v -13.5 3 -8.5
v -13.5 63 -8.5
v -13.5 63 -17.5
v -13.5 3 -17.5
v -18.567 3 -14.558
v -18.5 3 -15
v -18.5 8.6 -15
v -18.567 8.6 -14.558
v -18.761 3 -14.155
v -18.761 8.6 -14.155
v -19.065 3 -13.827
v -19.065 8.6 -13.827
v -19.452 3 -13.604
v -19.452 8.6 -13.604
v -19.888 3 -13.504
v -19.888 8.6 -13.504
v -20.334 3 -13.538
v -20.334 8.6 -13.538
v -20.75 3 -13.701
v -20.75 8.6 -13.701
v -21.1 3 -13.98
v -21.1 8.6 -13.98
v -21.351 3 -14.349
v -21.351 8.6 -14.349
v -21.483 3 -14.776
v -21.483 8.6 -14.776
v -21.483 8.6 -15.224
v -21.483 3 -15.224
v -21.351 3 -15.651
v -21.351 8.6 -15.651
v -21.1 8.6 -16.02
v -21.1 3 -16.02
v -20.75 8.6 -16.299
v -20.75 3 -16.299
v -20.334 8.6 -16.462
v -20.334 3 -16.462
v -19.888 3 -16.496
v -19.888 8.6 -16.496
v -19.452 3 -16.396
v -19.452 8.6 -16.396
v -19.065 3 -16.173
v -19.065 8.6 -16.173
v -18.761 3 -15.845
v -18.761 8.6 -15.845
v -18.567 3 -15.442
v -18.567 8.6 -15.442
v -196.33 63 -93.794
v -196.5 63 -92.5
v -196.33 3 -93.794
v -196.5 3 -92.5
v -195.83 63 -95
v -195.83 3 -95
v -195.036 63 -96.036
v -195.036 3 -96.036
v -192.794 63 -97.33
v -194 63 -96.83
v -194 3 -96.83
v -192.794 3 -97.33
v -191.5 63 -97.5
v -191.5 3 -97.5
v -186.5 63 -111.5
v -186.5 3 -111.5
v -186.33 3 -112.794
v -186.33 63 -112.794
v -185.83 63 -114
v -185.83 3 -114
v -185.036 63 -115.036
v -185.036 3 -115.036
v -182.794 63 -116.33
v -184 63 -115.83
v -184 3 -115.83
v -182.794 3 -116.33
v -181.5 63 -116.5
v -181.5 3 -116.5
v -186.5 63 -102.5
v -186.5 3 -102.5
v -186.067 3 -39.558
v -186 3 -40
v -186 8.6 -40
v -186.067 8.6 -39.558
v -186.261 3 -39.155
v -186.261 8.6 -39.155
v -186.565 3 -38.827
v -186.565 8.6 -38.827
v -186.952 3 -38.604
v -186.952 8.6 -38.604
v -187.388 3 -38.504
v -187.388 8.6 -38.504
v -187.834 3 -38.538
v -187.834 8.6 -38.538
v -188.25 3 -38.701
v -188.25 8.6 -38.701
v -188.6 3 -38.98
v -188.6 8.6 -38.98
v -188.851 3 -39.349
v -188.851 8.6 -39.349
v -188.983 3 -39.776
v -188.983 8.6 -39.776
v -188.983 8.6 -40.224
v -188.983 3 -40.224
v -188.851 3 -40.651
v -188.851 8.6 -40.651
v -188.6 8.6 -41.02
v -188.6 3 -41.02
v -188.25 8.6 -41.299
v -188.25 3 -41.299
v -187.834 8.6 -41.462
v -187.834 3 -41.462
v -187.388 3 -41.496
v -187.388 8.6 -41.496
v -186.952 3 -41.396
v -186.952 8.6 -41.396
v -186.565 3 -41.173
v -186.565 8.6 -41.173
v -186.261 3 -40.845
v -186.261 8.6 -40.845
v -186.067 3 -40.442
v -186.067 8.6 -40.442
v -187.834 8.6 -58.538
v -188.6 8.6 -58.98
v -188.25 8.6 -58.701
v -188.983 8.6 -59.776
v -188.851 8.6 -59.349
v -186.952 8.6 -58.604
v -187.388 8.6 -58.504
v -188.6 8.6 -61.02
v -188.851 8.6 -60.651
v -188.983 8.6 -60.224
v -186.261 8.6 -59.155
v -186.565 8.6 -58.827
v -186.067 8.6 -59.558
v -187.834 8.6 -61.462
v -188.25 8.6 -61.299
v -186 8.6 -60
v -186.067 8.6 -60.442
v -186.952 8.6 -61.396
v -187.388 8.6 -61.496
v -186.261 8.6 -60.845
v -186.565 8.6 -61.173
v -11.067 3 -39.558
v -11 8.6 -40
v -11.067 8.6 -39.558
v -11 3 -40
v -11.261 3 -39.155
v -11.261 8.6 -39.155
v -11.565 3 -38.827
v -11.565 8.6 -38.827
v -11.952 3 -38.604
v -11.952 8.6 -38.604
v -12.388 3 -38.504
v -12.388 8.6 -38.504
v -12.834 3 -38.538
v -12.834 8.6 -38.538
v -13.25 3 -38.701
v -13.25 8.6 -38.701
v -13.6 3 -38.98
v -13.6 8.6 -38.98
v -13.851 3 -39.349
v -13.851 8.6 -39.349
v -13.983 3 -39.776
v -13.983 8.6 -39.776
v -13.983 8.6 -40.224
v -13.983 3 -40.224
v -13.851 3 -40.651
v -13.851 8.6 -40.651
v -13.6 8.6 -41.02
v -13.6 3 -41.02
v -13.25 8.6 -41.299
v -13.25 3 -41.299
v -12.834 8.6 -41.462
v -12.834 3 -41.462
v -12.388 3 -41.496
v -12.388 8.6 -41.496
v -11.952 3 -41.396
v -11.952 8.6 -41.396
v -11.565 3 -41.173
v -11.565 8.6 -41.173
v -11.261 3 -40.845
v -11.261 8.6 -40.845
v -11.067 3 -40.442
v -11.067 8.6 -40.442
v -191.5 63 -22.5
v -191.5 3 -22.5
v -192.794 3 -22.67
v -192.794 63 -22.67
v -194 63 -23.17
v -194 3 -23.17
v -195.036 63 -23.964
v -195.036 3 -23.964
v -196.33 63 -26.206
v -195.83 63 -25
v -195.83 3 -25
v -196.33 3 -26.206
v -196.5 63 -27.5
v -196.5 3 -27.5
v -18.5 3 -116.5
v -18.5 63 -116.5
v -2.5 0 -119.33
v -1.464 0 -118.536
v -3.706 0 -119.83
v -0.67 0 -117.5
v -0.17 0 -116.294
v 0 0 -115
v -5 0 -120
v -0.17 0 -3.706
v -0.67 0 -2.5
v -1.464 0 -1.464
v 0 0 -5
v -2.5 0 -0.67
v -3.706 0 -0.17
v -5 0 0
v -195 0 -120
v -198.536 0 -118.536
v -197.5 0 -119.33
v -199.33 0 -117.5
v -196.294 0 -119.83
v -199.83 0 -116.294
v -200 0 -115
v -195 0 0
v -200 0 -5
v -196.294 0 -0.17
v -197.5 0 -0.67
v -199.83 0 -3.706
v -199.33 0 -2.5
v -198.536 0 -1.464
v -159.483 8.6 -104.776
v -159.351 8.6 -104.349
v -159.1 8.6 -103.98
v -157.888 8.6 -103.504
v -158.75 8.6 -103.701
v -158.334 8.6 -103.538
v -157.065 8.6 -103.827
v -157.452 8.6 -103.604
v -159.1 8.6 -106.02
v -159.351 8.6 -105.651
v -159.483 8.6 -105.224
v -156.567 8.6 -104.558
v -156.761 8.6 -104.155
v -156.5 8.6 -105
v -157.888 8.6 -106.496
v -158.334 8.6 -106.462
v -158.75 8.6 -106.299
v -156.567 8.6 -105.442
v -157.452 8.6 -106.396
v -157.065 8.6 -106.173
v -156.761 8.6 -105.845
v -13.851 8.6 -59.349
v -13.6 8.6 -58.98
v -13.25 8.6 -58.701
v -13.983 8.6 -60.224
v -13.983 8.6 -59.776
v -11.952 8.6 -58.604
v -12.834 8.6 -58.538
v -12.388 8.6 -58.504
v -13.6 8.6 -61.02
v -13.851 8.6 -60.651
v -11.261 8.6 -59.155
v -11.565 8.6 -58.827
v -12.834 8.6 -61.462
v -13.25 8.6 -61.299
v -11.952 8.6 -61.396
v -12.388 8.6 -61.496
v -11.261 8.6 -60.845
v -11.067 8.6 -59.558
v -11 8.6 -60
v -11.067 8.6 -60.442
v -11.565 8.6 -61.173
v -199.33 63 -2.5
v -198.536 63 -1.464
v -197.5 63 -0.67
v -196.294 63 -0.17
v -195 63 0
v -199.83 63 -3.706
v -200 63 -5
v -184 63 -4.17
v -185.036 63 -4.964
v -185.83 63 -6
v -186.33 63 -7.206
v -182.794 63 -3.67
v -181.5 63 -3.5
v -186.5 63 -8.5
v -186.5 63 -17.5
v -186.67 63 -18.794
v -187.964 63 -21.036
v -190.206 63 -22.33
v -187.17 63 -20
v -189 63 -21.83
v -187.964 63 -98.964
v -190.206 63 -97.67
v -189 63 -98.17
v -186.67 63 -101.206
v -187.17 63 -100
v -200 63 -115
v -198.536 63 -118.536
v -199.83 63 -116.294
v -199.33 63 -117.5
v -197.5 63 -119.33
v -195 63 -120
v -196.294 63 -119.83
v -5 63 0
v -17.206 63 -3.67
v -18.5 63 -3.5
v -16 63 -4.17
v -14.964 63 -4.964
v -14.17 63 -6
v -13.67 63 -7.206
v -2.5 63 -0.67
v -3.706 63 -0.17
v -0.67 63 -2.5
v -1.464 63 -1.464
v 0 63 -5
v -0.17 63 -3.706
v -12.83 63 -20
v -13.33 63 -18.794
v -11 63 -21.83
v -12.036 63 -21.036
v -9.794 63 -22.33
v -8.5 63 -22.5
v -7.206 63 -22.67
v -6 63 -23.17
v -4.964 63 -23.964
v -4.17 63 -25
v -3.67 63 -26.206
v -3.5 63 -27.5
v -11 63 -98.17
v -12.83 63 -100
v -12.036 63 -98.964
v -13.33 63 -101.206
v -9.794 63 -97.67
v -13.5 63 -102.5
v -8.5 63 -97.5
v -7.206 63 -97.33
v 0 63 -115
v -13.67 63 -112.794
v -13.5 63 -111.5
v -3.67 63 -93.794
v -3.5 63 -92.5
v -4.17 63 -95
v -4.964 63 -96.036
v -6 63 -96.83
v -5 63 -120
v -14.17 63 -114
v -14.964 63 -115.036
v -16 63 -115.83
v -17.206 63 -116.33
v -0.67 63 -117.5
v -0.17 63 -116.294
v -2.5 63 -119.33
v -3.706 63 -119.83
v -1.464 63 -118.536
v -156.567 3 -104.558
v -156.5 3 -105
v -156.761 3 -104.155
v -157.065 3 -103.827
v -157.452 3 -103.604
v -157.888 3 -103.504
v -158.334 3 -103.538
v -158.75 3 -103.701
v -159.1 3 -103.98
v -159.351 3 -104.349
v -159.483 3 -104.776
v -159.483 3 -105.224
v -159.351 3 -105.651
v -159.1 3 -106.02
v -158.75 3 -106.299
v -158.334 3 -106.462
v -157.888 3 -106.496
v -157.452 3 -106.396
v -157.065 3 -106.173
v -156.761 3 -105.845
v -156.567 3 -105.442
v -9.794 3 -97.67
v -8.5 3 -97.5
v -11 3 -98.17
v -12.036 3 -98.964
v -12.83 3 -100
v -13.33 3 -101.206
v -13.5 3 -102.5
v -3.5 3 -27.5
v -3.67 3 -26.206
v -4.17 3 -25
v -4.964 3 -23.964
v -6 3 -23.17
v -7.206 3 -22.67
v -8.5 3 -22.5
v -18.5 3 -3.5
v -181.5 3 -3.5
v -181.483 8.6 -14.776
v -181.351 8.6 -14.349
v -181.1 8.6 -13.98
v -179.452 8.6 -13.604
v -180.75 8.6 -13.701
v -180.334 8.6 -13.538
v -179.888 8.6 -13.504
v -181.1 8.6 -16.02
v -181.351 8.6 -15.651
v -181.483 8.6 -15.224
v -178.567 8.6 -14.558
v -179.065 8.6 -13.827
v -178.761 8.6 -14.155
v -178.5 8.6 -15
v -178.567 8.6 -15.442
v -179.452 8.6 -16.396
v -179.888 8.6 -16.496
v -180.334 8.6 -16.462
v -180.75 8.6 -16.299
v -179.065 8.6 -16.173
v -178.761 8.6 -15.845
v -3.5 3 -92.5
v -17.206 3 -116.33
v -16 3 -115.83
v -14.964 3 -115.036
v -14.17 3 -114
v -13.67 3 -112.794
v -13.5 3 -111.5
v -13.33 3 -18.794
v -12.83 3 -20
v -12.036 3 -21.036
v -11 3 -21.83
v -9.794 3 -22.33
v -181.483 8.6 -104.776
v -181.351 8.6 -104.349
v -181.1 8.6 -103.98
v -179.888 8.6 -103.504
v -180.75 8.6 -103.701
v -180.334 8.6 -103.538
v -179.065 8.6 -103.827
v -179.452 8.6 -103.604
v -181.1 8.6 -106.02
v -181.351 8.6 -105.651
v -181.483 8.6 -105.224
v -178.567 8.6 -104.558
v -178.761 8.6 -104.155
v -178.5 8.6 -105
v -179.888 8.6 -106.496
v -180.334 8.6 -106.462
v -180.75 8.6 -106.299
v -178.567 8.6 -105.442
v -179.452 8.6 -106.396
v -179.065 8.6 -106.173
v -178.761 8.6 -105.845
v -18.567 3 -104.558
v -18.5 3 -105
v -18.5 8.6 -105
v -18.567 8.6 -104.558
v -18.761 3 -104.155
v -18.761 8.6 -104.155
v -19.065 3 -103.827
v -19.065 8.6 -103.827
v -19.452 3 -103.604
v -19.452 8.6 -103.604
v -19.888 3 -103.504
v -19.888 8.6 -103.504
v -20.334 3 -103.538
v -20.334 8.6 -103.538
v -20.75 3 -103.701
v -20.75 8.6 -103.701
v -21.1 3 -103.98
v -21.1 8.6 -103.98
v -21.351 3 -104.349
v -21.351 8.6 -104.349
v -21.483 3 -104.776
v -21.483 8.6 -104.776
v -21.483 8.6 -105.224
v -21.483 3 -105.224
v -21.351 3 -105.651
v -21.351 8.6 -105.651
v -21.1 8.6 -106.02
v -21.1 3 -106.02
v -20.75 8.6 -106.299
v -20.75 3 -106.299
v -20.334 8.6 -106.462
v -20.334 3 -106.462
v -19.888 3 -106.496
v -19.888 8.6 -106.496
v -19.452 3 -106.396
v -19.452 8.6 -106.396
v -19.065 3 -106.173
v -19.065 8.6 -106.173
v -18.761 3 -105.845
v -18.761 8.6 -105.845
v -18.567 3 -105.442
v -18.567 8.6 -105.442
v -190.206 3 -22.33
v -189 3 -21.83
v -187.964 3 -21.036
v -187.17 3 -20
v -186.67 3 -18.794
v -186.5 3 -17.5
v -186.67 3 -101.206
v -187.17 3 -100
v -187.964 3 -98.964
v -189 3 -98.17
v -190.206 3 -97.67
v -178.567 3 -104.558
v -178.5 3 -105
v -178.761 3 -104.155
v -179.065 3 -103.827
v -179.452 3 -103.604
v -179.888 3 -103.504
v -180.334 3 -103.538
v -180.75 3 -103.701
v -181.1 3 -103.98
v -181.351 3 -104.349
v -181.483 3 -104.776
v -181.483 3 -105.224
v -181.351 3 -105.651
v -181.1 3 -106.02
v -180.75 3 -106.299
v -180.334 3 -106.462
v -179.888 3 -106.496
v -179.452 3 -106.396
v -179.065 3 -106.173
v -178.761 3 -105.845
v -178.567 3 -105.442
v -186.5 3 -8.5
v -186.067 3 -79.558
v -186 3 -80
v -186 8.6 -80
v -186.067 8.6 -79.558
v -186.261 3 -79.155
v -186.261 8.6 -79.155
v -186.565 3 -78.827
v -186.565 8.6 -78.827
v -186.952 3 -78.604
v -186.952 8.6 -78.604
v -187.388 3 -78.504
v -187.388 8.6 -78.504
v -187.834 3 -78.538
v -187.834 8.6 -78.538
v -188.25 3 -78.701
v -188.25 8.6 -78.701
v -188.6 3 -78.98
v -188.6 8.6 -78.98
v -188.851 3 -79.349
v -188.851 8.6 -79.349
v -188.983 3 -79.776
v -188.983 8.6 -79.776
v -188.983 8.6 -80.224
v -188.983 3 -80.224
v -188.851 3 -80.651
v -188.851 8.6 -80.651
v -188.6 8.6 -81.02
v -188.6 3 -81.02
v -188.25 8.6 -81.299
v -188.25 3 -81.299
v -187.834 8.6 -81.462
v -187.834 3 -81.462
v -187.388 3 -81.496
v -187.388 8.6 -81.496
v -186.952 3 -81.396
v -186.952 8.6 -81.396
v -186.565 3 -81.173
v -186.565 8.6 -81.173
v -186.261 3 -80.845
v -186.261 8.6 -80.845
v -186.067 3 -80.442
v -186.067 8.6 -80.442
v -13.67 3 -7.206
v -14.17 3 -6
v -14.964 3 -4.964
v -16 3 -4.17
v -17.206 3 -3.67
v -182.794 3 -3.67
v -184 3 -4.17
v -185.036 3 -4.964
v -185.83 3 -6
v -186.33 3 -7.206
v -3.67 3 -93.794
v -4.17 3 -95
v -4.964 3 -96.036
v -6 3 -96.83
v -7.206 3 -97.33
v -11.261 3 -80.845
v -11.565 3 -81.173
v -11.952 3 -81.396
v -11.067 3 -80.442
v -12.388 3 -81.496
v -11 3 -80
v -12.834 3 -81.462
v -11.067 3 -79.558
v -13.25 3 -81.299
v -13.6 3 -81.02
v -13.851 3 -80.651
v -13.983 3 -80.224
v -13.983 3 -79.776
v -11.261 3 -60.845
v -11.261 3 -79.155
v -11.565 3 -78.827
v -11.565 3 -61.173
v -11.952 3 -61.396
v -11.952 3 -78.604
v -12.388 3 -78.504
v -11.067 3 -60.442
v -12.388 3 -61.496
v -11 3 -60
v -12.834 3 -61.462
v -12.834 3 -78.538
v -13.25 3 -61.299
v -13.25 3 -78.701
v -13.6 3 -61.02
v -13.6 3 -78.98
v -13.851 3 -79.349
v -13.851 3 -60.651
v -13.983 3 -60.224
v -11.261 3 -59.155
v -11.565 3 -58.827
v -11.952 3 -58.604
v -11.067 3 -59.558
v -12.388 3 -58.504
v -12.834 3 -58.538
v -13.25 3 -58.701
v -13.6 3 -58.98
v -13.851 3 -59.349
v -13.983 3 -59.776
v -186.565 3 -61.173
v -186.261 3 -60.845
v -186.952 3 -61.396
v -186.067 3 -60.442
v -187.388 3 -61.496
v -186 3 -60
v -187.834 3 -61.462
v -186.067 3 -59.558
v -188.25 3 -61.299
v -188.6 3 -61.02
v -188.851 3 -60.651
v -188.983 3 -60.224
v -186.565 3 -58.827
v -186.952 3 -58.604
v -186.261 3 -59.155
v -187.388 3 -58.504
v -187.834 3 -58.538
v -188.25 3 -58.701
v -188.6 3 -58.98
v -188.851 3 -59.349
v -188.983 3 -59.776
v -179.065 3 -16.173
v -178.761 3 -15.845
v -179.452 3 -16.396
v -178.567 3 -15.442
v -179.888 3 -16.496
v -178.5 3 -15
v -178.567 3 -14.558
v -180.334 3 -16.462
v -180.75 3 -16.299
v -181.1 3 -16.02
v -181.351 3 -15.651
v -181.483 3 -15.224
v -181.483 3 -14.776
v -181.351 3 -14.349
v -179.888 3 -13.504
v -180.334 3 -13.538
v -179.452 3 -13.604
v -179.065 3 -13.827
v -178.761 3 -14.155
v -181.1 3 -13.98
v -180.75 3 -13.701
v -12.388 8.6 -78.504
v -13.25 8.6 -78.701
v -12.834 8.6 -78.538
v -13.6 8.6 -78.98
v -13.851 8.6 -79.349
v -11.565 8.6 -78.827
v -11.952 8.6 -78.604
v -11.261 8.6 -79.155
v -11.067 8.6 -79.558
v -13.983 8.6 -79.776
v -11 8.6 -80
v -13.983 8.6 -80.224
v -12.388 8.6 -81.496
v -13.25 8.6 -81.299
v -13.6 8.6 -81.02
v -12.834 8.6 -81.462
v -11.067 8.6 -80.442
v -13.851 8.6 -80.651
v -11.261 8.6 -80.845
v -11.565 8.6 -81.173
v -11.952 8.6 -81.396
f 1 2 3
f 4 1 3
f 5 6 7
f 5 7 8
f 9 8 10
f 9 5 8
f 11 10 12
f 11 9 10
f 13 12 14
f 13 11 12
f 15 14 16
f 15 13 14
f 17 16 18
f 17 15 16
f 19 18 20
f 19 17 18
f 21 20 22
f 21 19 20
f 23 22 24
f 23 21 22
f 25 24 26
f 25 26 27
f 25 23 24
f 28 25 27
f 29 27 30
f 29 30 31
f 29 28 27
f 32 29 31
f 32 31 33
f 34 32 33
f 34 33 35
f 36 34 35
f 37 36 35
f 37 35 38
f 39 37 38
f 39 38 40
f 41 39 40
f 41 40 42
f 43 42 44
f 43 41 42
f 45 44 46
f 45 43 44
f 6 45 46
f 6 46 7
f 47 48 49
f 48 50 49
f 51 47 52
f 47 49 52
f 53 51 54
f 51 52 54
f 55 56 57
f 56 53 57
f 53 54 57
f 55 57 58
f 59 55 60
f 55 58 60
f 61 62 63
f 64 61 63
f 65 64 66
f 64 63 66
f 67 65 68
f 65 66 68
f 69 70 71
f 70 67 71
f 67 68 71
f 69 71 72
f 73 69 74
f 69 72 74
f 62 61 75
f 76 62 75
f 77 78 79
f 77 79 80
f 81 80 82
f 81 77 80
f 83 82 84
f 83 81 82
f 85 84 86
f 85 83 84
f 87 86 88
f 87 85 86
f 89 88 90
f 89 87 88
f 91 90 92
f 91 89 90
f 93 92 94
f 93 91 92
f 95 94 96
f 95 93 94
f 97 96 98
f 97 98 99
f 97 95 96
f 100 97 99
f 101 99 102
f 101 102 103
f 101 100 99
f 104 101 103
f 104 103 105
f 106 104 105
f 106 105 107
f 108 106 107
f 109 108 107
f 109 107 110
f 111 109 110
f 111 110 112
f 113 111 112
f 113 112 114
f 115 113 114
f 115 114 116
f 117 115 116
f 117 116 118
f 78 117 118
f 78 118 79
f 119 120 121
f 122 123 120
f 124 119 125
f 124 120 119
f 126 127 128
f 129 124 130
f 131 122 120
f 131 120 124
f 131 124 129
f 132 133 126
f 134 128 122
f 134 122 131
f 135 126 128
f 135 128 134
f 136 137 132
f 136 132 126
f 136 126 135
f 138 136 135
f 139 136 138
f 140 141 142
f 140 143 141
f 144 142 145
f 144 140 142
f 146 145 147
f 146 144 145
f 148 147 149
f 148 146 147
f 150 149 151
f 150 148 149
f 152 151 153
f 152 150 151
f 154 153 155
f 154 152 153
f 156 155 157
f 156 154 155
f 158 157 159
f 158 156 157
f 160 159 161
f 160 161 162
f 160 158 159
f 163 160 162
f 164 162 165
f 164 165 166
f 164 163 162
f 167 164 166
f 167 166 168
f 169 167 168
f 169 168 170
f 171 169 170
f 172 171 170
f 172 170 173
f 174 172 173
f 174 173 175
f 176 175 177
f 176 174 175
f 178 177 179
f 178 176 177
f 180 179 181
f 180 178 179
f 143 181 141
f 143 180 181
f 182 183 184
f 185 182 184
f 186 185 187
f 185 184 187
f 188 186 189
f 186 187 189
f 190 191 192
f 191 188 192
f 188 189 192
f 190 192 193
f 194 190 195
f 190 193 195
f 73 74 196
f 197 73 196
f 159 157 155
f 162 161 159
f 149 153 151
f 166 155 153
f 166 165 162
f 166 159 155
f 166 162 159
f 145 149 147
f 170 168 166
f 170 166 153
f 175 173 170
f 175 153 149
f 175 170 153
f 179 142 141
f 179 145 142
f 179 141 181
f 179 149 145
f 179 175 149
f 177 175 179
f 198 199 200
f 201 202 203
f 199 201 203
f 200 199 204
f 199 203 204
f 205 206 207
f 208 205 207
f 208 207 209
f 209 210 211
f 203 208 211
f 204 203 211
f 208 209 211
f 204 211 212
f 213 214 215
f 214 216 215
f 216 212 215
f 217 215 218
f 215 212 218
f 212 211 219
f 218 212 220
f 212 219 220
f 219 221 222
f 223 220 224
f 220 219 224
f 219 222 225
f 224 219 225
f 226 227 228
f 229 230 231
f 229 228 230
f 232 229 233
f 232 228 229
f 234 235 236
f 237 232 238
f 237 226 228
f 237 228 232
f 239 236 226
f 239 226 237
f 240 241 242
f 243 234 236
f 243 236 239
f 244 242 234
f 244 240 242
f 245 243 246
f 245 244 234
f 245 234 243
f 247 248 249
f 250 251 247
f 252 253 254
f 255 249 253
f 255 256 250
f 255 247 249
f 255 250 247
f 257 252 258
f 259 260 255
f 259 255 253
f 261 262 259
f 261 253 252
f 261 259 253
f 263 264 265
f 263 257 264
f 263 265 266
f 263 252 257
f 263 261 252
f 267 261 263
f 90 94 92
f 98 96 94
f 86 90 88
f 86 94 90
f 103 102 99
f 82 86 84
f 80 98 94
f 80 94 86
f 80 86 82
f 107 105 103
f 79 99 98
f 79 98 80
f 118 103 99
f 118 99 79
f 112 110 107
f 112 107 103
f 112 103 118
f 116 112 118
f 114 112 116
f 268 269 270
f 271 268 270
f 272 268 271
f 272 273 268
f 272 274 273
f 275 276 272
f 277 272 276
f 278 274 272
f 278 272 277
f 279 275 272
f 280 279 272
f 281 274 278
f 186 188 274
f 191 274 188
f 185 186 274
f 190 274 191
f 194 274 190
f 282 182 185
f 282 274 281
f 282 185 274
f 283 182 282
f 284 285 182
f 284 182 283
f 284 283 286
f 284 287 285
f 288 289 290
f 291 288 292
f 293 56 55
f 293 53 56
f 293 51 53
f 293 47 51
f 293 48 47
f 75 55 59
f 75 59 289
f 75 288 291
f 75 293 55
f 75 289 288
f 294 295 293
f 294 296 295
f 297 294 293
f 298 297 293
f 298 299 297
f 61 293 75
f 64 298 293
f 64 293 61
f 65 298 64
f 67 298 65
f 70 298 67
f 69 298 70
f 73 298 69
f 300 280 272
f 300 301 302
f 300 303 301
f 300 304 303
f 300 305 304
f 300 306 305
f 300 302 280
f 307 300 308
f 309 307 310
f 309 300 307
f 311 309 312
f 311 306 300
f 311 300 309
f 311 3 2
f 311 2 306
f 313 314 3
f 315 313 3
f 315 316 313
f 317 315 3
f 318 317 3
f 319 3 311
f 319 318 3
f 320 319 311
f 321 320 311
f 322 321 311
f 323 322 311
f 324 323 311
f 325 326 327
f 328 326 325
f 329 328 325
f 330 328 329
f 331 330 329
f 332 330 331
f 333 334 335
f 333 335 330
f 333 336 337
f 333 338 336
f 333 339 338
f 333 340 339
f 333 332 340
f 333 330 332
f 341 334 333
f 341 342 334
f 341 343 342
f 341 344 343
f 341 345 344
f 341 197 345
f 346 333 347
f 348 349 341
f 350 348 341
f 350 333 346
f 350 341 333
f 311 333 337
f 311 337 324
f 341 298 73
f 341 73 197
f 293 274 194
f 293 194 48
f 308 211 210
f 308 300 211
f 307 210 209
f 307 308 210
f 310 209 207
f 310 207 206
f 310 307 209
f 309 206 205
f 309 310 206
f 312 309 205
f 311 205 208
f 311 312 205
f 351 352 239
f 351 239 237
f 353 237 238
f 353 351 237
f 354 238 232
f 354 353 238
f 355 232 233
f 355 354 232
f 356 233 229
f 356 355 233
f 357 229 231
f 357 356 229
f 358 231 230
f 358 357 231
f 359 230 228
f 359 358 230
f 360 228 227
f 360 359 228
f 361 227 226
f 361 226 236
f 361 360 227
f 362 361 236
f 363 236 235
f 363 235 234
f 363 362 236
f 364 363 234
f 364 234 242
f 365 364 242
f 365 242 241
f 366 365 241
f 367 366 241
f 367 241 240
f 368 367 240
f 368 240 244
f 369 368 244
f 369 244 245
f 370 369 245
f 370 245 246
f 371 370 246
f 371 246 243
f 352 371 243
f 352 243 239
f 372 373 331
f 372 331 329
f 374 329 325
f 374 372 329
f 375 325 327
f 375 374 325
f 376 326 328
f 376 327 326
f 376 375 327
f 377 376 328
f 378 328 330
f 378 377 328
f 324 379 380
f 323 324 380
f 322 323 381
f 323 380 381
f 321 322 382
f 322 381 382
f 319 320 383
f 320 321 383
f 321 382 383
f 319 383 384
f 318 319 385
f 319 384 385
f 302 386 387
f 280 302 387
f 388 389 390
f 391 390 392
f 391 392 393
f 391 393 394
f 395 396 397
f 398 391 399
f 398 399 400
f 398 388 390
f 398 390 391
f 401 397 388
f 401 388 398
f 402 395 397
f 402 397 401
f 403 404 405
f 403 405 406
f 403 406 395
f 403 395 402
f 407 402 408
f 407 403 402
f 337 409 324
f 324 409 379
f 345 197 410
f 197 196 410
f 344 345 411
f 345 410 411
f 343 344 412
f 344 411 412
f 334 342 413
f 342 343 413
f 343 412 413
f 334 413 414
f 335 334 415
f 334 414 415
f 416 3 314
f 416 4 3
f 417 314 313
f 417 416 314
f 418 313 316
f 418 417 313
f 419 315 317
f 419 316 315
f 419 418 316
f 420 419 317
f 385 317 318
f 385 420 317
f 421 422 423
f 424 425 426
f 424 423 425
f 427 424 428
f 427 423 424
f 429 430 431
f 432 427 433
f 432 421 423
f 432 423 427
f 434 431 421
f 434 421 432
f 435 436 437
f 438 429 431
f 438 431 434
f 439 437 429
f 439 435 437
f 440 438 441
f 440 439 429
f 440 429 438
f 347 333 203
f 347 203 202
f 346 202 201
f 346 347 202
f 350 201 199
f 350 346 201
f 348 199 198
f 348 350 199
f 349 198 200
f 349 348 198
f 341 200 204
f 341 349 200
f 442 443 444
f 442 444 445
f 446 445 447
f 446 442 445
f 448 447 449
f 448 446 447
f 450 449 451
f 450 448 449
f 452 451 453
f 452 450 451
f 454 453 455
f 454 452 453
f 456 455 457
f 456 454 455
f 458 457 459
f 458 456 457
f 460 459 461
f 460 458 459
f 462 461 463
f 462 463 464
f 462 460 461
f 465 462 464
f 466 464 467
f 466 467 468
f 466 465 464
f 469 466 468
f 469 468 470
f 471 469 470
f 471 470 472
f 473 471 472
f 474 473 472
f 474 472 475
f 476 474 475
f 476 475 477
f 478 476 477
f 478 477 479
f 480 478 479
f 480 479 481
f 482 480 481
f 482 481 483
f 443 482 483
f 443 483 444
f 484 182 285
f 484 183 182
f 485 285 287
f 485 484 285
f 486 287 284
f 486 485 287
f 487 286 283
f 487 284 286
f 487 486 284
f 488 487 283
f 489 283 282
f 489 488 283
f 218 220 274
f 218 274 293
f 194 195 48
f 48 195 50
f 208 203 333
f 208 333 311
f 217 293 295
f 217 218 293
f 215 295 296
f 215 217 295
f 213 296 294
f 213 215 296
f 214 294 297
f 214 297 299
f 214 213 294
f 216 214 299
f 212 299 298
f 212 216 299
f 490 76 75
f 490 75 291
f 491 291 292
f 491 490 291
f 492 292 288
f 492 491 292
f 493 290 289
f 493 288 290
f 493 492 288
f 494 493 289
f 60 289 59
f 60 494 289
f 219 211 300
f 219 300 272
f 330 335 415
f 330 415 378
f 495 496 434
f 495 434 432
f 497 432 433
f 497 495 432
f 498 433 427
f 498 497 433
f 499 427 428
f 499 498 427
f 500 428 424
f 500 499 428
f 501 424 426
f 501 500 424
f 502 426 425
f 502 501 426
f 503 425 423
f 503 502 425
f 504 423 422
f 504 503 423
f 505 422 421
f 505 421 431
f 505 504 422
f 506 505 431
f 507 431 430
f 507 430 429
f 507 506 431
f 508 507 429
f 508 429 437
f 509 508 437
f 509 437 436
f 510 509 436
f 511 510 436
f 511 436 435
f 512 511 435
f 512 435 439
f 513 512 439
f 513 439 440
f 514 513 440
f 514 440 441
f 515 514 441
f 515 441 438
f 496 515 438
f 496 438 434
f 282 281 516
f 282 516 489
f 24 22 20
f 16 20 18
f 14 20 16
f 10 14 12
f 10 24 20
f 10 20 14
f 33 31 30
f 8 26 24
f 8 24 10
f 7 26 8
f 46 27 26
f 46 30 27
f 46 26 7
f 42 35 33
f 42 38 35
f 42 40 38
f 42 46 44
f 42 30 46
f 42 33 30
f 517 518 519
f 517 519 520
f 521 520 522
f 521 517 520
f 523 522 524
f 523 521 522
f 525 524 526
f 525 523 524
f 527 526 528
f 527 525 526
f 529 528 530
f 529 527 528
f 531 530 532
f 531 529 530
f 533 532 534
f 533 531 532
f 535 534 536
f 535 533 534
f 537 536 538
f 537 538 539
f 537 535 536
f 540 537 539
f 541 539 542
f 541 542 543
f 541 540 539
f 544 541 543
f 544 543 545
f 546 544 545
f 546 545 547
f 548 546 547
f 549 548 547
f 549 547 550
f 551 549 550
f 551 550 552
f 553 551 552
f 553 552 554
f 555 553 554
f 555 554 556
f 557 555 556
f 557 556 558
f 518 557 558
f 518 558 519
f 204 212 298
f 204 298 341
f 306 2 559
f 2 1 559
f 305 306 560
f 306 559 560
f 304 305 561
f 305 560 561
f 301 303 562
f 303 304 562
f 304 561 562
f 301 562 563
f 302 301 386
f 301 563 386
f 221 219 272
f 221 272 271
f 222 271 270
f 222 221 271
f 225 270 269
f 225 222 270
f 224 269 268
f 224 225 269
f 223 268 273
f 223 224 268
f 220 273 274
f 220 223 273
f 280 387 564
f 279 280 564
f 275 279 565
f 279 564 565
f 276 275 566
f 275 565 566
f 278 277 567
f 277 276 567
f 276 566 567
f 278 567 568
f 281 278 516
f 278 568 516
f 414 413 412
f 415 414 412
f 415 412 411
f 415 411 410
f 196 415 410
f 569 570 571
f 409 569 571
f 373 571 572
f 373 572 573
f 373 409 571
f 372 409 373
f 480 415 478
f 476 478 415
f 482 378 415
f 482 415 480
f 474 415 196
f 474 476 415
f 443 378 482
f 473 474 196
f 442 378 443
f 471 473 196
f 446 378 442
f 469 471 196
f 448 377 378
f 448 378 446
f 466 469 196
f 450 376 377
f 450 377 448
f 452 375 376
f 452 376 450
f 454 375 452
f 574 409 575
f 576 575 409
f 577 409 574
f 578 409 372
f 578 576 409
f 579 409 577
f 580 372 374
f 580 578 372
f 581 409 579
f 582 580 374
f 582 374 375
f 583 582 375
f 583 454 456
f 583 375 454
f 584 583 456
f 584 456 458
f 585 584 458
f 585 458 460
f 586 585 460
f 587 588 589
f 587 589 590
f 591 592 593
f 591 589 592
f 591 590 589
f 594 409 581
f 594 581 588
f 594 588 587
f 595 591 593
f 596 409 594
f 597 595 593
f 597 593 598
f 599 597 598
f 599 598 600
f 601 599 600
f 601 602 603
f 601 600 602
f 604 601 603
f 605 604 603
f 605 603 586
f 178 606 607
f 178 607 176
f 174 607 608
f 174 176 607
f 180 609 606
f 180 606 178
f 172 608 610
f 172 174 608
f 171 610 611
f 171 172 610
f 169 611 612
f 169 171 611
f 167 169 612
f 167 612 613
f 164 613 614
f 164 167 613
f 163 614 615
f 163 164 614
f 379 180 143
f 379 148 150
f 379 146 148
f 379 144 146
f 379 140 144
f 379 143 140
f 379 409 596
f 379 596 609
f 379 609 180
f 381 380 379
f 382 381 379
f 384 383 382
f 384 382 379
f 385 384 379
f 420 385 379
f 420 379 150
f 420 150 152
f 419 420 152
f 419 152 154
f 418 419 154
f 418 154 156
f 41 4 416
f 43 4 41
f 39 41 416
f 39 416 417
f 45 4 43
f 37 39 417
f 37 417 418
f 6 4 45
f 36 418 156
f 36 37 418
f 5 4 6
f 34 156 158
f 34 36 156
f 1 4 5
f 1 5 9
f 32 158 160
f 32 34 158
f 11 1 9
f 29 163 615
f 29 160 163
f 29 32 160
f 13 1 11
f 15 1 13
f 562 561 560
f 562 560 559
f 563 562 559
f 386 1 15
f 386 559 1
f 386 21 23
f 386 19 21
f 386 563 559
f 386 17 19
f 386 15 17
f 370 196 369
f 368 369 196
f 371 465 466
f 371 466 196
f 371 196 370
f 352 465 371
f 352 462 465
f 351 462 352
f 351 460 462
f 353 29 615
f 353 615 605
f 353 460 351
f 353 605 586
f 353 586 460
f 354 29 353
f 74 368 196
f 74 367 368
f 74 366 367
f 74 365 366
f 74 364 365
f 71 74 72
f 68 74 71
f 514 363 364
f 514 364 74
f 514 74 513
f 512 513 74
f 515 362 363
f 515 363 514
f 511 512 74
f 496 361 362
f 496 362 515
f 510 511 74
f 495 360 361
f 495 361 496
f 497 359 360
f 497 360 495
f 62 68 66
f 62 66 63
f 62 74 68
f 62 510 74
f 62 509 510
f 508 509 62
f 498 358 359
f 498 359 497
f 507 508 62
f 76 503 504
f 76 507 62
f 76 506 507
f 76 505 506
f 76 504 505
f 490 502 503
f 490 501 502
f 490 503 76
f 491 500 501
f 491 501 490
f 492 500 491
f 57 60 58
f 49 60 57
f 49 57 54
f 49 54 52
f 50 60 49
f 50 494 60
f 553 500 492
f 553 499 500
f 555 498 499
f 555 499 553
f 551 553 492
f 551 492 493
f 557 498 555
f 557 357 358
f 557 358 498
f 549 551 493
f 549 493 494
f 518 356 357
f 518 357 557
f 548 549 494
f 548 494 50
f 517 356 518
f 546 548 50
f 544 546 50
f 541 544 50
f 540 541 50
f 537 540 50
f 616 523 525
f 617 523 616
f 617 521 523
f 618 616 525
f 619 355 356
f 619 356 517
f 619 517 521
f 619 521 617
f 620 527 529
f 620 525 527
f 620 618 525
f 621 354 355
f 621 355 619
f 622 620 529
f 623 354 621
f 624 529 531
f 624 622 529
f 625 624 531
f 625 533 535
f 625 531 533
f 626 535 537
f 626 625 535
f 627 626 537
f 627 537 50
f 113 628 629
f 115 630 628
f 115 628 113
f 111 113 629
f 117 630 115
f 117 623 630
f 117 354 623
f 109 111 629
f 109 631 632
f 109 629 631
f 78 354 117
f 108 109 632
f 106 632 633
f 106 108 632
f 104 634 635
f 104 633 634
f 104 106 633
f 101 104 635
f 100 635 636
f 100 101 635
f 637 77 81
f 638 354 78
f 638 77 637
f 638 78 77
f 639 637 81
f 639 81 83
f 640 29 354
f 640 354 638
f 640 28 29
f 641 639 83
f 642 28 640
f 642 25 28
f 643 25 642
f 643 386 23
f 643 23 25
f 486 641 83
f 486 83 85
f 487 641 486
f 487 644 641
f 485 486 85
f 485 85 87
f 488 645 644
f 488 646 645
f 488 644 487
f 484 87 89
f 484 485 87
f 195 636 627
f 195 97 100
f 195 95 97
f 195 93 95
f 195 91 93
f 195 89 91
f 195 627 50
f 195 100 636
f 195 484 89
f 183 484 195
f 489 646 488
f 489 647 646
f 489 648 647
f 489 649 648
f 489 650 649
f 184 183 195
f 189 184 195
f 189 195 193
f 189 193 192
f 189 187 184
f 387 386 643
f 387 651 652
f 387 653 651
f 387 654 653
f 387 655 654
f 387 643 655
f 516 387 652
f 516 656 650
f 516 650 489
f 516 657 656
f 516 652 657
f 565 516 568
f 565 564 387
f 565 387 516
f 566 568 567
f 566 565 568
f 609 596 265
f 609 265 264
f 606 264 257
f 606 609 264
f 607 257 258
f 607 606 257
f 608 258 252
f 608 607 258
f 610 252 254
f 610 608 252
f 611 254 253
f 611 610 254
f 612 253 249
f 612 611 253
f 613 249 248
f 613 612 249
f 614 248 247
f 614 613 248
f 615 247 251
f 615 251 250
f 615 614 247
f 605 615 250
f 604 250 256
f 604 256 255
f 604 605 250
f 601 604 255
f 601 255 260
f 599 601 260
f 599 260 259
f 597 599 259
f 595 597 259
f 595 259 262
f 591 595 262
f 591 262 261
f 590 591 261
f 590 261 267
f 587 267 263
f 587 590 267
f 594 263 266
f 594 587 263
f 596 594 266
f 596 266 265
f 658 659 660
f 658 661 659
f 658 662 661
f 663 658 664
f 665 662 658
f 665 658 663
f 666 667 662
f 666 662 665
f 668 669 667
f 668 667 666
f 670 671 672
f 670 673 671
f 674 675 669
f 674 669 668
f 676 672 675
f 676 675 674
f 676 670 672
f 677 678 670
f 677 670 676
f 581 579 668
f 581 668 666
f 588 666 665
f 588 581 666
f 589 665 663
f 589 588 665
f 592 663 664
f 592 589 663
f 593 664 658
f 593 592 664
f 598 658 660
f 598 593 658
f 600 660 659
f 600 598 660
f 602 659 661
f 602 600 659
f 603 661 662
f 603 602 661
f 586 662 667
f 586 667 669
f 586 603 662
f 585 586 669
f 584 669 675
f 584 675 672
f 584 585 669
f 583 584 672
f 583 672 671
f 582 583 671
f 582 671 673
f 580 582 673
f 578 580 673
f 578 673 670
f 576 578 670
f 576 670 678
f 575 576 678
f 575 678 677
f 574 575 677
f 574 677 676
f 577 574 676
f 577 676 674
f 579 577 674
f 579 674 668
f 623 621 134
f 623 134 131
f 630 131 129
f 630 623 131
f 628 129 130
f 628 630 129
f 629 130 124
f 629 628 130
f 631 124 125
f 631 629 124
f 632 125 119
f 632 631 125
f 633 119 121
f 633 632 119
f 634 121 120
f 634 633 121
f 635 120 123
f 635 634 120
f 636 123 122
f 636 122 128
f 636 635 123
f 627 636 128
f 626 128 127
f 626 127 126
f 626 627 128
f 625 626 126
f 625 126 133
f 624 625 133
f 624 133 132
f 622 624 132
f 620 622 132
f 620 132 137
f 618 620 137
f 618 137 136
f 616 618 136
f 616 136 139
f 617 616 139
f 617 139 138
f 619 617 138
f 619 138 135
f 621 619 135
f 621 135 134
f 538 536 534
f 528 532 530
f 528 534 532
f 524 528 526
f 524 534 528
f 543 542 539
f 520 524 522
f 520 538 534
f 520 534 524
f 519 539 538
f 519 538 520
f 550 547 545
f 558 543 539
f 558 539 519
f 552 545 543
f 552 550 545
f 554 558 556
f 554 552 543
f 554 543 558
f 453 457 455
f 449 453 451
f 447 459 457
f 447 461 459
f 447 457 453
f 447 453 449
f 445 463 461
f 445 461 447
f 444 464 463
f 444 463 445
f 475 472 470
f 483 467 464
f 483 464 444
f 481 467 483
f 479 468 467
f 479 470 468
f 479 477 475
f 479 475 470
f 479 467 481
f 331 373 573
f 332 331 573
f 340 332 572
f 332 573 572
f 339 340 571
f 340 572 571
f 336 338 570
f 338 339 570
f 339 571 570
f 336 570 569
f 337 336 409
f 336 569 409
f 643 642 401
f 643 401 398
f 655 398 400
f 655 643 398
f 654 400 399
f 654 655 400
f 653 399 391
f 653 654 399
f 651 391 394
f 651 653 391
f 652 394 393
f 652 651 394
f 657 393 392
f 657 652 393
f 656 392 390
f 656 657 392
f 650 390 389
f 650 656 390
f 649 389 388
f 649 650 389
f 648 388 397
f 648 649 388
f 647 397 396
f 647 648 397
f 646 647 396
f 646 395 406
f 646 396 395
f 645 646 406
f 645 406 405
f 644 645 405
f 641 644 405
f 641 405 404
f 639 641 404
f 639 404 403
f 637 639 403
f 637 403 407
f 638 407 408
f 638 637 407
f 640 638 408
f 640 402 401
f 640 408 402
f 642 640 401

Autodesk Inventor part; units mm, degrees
ref_plane "YZ Plane" through (0, 0, 0) normal (1, 0, 0) x (0, 1, 0)
ref_plane "XZ Plane" through (0, 0, 0) normal (0, 1, 0) x (-1, 0, 0)
ref_plane "XY Plane" through (0, 0, 0) normal (0, 0, 1) x (1, 0, 0)
sketch "Sketch1" plane through (0, 0, 0) normal (0, 1, 0) x (-1, 0, 0)
  line L0 (0, 0) -> (200, 0)
  line L1 (200, 0) -> (200, -120)
  line L2 (200, -120) -> (0, -120)
  line L3 (0, -120) -> (0, 0)
  dimension "d0" = 200
  dimension "d1" = 120
extrude "Extrusion1" add sketch "Sketch1" along normal blind 3
sketch "Sketch2" plane through (0, 3, 0) normal (0, 1, 0) x (1, 0, 0)
  line L0 (-200, 0) -> (0, 0) projected
  line L1 (0, 0) -> (0, 120) projected
  line L2 (0, 120) -> (-200, 120) projected
  line L3 (-200, 120) -> (-200, 0) projected
  line L4 (-181.5, 116.5) -> (-18.5, 116.5)
  line L5 (-3.5, 92.5) -> (-3.5, 27.5)
  line L6 (-18.5, 3.5) -> (-181.5, 3.5)
  line L7 (-196.5, 27.5) -> (-196.5, 92.5)
  line L8 (-196.5, 3.5) -> (-186.5, 3.5)
  line L9 (-186.5, 8.5) -> (-186.5, 17.5)
  line L10 (-191.5, 22.5) -> (-191.5, 22.5)
  line L11 (-196.5, 22.5) -> (-196.5, 3.5)
  line L12 (-196.5, 116.5) -> (-186.5, 116.5)
  line L13 (-186.5, 111.5) -> (-186.5, 102.5)
  line L14 (-191.5, 97.5) -> (-191.5, 97.5)
  line L15 (-196.5, 97.5) -> (-196.5, 116.5)
  line L16 (-3.5, 116.5) -> (-13.5, 116.5)
  line L17 (-13.5, 111.5) -> (-13.5, 102.5)
  line L18 (-8.5, 97.5) -> (-8.5, 97.5)
  line L19 (-3.5, 97.5) -> (-3.5, 116.5)
  line L20 (-3.5, 3.5) -> (-13.5, 3.5)
  line L21 (-13.5, 8.5) -> (-13.5, 17.5)
  line L22 (-8.5, 22.5) -> (-8.5, 22.5)
  line L23 (-3.5, 22.5) -> (-3.5, 3.5)
  arc A0 (-3.5, 92.5) -> (-8.5, 97.5) centre (-8.5, 92.5) ccw
  arc A1 (-13.5, 111.5) -> (-18.5, 116.5) centre (-18.5, 111.5) ccw
  arc A2 (-8.5, 22.5) -> (-3.5, 27.5) centre (-8.5, 27.5) ccw
  arc A3 (-18.5, 3.5) -> (-13.5, 8.5) centre (-18.5, 8.5) ccw
  arc A4 (-186.5, 8.5) -> (-181.5, 3.5) centre (-181.5, 8.5) ccw
  arc A5 (-196.5, 27.5) -> (-191.5, 22.5) centre (-191.5, 27.5) ccw
  arc A6 (-191.5, 97.5) -> (-196.5, 92.5) centre (-191.5, 92.5) ccw
  arc A7 (-181.5, 116.5) -> (-186.5, 111.5) centre (-181.5, 111.5) ccw
  arc A8 (-191.5, 97.5) -> (-186.5, 102.5) centre (-191.5, 102.5) ccw
  arc A9 (-186.5, 17.5) -> (-191.5, 22.5) centre (-191.5, 17.5) ccw
  arc A10 (-8.5, 22.5) -> (-13.5, 17.5) centre (-8.5, 17.5) ccw
  arc A11 (-13.5, 102.5) -> (-8.5, 97.5) centre (-8.5, 102.5) ccw
  line L24 (-196.5, 116.5) -> (-200, 116.5)
  line L25 (-196.5, 3.5) -> (-200, 3.5)
  line L26 (-3.5, 3.5) -> (-3.5, 0)
  line L27 (-3.5, 116.5) -> (-3.5, 120)
  line L28 (-196.5, 3.5) -> (-196.5, 0)
  point P0 (-186.5, 22.5)
  point P1 (-186.5, 97.5)
  point P2 (-13.5, 97.5)
  point P3 (-13.5, 22.5)
  dimension "d4" = 3.5
  dimension "d7" = 10
  dimension "d8" = 19
  dimension "d9" = 10
  dimension "d10" = 19
  dimension "d11" = 10
  dimension "d12" = 19
  dimension "d13" = 10
  dimension "d14" = 19
  dimension "d15" = 5
  dimension "d16" = 5
  dimension "d17" = 5
  dimension "d18" = 5
  dimension "d19" = 5
  dimension "d20" = 5
  dimension "d21" = 5
  dimension "d22" = 5
  dimension "d23" = 5
  dimension "d73" = 3.5
  dimension "d74" = 3.5
  dimension "d75" = 3.5
  dimension "d78" = 3.5
extrude "Extrusion2" add sketch "Sketch2" along normal blind 60
sketch "Sketch3" plane through (0, 3, 0) normal (0, 1, 0) x (1, 0, 0)
  line L0 (-200, 120) -> (-200, 105)
  line L1 (-200, 120) -> (-200, 0) projected
  line L2 (0, 120) -> (0, 0) projected
  line L3 (0, 0) -> (0, 15)
  line L4 (-181.5, 3.5) -> (-18.5, 3.5) projected
  circle A0 centre (-180, 105) radius 1.5
  line L5 (-180, 105) -> (-158, 105)
  circle A1 centre (-158, 105) radius 1.5
  circle A2 centre (-187.5, 60) radius 1.5
  line L6 (-187.5, 60) -> (-187.5, 80)
  line L7 (-187.5, 60) -> (-187.5, 40)
  circle A3 centre (-187.5, 40) radius 1.5
  circle A4 centre (-187.5, 80) radius 1.5
  line L8 (-200, 0) -> (-200, 120) projected
  line L9 (-187.5, 60) -> (-12.5, 60)
  circle A5 centre (-12.5, 60) radius 1.5
  line L10 (0, 120) -> (-200, 120) projected
  line L11 (-100, 120) -> (-100, 0)
  line L12 (0, 0) -> (-200, 0) projected
  circle A6 centre (-20, 105) radius 1.5
  line L13 (-180, 105) -> (-181.5, 105)
  line L14 (-184, 106) -> (-200, 106)
  line L15 (-180, 105) -> (-159.5, 105)
  line L16 (-180, 15) -> (-20, 15)
  circle A7 centre (-180, 15) radius 1.5
  line L17 (-84.857, 105) -> (-84.857, 15)
  line L18 (-158, 105) -> (-20, 105)
  circle A8 centre (-20, 15) radius 1.5
  line L19 (-12.5, 60) -> (-12.5, 40)
  line L20 (-12.5, 60) -> (-12.5, 80)
  circle A9 centre (-12.5, 80) radius 1.5
  circle A10 centre (-12.5, 40) radius 1.5
  line L21 (-180, 105) -> (-20, 105)
  line L22 (-13.5, 111.5) -> (-13.5, 102.5) projected
  point P0 (-100, 60)
  point P1 (-100, 15)
  point P2 (-84.857, 60)
  point P3 (-100, 105)
  dimension "d35" = 3
  dimension "d37" = 3
  dimension "d24" = 15
  dimension "d36" = 22
  dimension "d41" = 3
  dimension "d44" = 20
  dimension "d45" = 20
  dimension "d54" = 175
  dimension "d55" = 3
  dimension "d57" = 3
  dimension "d59" = 160
  dimension "d60" = 3
  dimension "d62" = 90
  dimension "d63" = 3
  dimension "d64" = 20
  dimension "d65" = 20
  dimension "d66" = 3
  dimension "d67" = 3
  dimension "d68" = 3
  dimension "d69" = 3
  dimension "d72" = 138
fillet "Fillet2" radius 5 4 edges at (0, 31.5, 0) (0, 31.5, -120) (-200, 31.5, -120) (-200, 31.5, 0)
extrude "Extrusion4" add sketch "Sketch3" along normal blind 5.6 contours A7 | A3 | A4 | A2 L7 L9 | L9 L6 A2 | A0 L13 L5 | L5 L13 A0 | A1 L5 L18 | L18 L5 A1 | A6 | A9 | A10 | A5 L20 L9 | L9 L19 A5 | A8 | L6 L7 A2 | L20 A5 L19
properties part number "boks"
